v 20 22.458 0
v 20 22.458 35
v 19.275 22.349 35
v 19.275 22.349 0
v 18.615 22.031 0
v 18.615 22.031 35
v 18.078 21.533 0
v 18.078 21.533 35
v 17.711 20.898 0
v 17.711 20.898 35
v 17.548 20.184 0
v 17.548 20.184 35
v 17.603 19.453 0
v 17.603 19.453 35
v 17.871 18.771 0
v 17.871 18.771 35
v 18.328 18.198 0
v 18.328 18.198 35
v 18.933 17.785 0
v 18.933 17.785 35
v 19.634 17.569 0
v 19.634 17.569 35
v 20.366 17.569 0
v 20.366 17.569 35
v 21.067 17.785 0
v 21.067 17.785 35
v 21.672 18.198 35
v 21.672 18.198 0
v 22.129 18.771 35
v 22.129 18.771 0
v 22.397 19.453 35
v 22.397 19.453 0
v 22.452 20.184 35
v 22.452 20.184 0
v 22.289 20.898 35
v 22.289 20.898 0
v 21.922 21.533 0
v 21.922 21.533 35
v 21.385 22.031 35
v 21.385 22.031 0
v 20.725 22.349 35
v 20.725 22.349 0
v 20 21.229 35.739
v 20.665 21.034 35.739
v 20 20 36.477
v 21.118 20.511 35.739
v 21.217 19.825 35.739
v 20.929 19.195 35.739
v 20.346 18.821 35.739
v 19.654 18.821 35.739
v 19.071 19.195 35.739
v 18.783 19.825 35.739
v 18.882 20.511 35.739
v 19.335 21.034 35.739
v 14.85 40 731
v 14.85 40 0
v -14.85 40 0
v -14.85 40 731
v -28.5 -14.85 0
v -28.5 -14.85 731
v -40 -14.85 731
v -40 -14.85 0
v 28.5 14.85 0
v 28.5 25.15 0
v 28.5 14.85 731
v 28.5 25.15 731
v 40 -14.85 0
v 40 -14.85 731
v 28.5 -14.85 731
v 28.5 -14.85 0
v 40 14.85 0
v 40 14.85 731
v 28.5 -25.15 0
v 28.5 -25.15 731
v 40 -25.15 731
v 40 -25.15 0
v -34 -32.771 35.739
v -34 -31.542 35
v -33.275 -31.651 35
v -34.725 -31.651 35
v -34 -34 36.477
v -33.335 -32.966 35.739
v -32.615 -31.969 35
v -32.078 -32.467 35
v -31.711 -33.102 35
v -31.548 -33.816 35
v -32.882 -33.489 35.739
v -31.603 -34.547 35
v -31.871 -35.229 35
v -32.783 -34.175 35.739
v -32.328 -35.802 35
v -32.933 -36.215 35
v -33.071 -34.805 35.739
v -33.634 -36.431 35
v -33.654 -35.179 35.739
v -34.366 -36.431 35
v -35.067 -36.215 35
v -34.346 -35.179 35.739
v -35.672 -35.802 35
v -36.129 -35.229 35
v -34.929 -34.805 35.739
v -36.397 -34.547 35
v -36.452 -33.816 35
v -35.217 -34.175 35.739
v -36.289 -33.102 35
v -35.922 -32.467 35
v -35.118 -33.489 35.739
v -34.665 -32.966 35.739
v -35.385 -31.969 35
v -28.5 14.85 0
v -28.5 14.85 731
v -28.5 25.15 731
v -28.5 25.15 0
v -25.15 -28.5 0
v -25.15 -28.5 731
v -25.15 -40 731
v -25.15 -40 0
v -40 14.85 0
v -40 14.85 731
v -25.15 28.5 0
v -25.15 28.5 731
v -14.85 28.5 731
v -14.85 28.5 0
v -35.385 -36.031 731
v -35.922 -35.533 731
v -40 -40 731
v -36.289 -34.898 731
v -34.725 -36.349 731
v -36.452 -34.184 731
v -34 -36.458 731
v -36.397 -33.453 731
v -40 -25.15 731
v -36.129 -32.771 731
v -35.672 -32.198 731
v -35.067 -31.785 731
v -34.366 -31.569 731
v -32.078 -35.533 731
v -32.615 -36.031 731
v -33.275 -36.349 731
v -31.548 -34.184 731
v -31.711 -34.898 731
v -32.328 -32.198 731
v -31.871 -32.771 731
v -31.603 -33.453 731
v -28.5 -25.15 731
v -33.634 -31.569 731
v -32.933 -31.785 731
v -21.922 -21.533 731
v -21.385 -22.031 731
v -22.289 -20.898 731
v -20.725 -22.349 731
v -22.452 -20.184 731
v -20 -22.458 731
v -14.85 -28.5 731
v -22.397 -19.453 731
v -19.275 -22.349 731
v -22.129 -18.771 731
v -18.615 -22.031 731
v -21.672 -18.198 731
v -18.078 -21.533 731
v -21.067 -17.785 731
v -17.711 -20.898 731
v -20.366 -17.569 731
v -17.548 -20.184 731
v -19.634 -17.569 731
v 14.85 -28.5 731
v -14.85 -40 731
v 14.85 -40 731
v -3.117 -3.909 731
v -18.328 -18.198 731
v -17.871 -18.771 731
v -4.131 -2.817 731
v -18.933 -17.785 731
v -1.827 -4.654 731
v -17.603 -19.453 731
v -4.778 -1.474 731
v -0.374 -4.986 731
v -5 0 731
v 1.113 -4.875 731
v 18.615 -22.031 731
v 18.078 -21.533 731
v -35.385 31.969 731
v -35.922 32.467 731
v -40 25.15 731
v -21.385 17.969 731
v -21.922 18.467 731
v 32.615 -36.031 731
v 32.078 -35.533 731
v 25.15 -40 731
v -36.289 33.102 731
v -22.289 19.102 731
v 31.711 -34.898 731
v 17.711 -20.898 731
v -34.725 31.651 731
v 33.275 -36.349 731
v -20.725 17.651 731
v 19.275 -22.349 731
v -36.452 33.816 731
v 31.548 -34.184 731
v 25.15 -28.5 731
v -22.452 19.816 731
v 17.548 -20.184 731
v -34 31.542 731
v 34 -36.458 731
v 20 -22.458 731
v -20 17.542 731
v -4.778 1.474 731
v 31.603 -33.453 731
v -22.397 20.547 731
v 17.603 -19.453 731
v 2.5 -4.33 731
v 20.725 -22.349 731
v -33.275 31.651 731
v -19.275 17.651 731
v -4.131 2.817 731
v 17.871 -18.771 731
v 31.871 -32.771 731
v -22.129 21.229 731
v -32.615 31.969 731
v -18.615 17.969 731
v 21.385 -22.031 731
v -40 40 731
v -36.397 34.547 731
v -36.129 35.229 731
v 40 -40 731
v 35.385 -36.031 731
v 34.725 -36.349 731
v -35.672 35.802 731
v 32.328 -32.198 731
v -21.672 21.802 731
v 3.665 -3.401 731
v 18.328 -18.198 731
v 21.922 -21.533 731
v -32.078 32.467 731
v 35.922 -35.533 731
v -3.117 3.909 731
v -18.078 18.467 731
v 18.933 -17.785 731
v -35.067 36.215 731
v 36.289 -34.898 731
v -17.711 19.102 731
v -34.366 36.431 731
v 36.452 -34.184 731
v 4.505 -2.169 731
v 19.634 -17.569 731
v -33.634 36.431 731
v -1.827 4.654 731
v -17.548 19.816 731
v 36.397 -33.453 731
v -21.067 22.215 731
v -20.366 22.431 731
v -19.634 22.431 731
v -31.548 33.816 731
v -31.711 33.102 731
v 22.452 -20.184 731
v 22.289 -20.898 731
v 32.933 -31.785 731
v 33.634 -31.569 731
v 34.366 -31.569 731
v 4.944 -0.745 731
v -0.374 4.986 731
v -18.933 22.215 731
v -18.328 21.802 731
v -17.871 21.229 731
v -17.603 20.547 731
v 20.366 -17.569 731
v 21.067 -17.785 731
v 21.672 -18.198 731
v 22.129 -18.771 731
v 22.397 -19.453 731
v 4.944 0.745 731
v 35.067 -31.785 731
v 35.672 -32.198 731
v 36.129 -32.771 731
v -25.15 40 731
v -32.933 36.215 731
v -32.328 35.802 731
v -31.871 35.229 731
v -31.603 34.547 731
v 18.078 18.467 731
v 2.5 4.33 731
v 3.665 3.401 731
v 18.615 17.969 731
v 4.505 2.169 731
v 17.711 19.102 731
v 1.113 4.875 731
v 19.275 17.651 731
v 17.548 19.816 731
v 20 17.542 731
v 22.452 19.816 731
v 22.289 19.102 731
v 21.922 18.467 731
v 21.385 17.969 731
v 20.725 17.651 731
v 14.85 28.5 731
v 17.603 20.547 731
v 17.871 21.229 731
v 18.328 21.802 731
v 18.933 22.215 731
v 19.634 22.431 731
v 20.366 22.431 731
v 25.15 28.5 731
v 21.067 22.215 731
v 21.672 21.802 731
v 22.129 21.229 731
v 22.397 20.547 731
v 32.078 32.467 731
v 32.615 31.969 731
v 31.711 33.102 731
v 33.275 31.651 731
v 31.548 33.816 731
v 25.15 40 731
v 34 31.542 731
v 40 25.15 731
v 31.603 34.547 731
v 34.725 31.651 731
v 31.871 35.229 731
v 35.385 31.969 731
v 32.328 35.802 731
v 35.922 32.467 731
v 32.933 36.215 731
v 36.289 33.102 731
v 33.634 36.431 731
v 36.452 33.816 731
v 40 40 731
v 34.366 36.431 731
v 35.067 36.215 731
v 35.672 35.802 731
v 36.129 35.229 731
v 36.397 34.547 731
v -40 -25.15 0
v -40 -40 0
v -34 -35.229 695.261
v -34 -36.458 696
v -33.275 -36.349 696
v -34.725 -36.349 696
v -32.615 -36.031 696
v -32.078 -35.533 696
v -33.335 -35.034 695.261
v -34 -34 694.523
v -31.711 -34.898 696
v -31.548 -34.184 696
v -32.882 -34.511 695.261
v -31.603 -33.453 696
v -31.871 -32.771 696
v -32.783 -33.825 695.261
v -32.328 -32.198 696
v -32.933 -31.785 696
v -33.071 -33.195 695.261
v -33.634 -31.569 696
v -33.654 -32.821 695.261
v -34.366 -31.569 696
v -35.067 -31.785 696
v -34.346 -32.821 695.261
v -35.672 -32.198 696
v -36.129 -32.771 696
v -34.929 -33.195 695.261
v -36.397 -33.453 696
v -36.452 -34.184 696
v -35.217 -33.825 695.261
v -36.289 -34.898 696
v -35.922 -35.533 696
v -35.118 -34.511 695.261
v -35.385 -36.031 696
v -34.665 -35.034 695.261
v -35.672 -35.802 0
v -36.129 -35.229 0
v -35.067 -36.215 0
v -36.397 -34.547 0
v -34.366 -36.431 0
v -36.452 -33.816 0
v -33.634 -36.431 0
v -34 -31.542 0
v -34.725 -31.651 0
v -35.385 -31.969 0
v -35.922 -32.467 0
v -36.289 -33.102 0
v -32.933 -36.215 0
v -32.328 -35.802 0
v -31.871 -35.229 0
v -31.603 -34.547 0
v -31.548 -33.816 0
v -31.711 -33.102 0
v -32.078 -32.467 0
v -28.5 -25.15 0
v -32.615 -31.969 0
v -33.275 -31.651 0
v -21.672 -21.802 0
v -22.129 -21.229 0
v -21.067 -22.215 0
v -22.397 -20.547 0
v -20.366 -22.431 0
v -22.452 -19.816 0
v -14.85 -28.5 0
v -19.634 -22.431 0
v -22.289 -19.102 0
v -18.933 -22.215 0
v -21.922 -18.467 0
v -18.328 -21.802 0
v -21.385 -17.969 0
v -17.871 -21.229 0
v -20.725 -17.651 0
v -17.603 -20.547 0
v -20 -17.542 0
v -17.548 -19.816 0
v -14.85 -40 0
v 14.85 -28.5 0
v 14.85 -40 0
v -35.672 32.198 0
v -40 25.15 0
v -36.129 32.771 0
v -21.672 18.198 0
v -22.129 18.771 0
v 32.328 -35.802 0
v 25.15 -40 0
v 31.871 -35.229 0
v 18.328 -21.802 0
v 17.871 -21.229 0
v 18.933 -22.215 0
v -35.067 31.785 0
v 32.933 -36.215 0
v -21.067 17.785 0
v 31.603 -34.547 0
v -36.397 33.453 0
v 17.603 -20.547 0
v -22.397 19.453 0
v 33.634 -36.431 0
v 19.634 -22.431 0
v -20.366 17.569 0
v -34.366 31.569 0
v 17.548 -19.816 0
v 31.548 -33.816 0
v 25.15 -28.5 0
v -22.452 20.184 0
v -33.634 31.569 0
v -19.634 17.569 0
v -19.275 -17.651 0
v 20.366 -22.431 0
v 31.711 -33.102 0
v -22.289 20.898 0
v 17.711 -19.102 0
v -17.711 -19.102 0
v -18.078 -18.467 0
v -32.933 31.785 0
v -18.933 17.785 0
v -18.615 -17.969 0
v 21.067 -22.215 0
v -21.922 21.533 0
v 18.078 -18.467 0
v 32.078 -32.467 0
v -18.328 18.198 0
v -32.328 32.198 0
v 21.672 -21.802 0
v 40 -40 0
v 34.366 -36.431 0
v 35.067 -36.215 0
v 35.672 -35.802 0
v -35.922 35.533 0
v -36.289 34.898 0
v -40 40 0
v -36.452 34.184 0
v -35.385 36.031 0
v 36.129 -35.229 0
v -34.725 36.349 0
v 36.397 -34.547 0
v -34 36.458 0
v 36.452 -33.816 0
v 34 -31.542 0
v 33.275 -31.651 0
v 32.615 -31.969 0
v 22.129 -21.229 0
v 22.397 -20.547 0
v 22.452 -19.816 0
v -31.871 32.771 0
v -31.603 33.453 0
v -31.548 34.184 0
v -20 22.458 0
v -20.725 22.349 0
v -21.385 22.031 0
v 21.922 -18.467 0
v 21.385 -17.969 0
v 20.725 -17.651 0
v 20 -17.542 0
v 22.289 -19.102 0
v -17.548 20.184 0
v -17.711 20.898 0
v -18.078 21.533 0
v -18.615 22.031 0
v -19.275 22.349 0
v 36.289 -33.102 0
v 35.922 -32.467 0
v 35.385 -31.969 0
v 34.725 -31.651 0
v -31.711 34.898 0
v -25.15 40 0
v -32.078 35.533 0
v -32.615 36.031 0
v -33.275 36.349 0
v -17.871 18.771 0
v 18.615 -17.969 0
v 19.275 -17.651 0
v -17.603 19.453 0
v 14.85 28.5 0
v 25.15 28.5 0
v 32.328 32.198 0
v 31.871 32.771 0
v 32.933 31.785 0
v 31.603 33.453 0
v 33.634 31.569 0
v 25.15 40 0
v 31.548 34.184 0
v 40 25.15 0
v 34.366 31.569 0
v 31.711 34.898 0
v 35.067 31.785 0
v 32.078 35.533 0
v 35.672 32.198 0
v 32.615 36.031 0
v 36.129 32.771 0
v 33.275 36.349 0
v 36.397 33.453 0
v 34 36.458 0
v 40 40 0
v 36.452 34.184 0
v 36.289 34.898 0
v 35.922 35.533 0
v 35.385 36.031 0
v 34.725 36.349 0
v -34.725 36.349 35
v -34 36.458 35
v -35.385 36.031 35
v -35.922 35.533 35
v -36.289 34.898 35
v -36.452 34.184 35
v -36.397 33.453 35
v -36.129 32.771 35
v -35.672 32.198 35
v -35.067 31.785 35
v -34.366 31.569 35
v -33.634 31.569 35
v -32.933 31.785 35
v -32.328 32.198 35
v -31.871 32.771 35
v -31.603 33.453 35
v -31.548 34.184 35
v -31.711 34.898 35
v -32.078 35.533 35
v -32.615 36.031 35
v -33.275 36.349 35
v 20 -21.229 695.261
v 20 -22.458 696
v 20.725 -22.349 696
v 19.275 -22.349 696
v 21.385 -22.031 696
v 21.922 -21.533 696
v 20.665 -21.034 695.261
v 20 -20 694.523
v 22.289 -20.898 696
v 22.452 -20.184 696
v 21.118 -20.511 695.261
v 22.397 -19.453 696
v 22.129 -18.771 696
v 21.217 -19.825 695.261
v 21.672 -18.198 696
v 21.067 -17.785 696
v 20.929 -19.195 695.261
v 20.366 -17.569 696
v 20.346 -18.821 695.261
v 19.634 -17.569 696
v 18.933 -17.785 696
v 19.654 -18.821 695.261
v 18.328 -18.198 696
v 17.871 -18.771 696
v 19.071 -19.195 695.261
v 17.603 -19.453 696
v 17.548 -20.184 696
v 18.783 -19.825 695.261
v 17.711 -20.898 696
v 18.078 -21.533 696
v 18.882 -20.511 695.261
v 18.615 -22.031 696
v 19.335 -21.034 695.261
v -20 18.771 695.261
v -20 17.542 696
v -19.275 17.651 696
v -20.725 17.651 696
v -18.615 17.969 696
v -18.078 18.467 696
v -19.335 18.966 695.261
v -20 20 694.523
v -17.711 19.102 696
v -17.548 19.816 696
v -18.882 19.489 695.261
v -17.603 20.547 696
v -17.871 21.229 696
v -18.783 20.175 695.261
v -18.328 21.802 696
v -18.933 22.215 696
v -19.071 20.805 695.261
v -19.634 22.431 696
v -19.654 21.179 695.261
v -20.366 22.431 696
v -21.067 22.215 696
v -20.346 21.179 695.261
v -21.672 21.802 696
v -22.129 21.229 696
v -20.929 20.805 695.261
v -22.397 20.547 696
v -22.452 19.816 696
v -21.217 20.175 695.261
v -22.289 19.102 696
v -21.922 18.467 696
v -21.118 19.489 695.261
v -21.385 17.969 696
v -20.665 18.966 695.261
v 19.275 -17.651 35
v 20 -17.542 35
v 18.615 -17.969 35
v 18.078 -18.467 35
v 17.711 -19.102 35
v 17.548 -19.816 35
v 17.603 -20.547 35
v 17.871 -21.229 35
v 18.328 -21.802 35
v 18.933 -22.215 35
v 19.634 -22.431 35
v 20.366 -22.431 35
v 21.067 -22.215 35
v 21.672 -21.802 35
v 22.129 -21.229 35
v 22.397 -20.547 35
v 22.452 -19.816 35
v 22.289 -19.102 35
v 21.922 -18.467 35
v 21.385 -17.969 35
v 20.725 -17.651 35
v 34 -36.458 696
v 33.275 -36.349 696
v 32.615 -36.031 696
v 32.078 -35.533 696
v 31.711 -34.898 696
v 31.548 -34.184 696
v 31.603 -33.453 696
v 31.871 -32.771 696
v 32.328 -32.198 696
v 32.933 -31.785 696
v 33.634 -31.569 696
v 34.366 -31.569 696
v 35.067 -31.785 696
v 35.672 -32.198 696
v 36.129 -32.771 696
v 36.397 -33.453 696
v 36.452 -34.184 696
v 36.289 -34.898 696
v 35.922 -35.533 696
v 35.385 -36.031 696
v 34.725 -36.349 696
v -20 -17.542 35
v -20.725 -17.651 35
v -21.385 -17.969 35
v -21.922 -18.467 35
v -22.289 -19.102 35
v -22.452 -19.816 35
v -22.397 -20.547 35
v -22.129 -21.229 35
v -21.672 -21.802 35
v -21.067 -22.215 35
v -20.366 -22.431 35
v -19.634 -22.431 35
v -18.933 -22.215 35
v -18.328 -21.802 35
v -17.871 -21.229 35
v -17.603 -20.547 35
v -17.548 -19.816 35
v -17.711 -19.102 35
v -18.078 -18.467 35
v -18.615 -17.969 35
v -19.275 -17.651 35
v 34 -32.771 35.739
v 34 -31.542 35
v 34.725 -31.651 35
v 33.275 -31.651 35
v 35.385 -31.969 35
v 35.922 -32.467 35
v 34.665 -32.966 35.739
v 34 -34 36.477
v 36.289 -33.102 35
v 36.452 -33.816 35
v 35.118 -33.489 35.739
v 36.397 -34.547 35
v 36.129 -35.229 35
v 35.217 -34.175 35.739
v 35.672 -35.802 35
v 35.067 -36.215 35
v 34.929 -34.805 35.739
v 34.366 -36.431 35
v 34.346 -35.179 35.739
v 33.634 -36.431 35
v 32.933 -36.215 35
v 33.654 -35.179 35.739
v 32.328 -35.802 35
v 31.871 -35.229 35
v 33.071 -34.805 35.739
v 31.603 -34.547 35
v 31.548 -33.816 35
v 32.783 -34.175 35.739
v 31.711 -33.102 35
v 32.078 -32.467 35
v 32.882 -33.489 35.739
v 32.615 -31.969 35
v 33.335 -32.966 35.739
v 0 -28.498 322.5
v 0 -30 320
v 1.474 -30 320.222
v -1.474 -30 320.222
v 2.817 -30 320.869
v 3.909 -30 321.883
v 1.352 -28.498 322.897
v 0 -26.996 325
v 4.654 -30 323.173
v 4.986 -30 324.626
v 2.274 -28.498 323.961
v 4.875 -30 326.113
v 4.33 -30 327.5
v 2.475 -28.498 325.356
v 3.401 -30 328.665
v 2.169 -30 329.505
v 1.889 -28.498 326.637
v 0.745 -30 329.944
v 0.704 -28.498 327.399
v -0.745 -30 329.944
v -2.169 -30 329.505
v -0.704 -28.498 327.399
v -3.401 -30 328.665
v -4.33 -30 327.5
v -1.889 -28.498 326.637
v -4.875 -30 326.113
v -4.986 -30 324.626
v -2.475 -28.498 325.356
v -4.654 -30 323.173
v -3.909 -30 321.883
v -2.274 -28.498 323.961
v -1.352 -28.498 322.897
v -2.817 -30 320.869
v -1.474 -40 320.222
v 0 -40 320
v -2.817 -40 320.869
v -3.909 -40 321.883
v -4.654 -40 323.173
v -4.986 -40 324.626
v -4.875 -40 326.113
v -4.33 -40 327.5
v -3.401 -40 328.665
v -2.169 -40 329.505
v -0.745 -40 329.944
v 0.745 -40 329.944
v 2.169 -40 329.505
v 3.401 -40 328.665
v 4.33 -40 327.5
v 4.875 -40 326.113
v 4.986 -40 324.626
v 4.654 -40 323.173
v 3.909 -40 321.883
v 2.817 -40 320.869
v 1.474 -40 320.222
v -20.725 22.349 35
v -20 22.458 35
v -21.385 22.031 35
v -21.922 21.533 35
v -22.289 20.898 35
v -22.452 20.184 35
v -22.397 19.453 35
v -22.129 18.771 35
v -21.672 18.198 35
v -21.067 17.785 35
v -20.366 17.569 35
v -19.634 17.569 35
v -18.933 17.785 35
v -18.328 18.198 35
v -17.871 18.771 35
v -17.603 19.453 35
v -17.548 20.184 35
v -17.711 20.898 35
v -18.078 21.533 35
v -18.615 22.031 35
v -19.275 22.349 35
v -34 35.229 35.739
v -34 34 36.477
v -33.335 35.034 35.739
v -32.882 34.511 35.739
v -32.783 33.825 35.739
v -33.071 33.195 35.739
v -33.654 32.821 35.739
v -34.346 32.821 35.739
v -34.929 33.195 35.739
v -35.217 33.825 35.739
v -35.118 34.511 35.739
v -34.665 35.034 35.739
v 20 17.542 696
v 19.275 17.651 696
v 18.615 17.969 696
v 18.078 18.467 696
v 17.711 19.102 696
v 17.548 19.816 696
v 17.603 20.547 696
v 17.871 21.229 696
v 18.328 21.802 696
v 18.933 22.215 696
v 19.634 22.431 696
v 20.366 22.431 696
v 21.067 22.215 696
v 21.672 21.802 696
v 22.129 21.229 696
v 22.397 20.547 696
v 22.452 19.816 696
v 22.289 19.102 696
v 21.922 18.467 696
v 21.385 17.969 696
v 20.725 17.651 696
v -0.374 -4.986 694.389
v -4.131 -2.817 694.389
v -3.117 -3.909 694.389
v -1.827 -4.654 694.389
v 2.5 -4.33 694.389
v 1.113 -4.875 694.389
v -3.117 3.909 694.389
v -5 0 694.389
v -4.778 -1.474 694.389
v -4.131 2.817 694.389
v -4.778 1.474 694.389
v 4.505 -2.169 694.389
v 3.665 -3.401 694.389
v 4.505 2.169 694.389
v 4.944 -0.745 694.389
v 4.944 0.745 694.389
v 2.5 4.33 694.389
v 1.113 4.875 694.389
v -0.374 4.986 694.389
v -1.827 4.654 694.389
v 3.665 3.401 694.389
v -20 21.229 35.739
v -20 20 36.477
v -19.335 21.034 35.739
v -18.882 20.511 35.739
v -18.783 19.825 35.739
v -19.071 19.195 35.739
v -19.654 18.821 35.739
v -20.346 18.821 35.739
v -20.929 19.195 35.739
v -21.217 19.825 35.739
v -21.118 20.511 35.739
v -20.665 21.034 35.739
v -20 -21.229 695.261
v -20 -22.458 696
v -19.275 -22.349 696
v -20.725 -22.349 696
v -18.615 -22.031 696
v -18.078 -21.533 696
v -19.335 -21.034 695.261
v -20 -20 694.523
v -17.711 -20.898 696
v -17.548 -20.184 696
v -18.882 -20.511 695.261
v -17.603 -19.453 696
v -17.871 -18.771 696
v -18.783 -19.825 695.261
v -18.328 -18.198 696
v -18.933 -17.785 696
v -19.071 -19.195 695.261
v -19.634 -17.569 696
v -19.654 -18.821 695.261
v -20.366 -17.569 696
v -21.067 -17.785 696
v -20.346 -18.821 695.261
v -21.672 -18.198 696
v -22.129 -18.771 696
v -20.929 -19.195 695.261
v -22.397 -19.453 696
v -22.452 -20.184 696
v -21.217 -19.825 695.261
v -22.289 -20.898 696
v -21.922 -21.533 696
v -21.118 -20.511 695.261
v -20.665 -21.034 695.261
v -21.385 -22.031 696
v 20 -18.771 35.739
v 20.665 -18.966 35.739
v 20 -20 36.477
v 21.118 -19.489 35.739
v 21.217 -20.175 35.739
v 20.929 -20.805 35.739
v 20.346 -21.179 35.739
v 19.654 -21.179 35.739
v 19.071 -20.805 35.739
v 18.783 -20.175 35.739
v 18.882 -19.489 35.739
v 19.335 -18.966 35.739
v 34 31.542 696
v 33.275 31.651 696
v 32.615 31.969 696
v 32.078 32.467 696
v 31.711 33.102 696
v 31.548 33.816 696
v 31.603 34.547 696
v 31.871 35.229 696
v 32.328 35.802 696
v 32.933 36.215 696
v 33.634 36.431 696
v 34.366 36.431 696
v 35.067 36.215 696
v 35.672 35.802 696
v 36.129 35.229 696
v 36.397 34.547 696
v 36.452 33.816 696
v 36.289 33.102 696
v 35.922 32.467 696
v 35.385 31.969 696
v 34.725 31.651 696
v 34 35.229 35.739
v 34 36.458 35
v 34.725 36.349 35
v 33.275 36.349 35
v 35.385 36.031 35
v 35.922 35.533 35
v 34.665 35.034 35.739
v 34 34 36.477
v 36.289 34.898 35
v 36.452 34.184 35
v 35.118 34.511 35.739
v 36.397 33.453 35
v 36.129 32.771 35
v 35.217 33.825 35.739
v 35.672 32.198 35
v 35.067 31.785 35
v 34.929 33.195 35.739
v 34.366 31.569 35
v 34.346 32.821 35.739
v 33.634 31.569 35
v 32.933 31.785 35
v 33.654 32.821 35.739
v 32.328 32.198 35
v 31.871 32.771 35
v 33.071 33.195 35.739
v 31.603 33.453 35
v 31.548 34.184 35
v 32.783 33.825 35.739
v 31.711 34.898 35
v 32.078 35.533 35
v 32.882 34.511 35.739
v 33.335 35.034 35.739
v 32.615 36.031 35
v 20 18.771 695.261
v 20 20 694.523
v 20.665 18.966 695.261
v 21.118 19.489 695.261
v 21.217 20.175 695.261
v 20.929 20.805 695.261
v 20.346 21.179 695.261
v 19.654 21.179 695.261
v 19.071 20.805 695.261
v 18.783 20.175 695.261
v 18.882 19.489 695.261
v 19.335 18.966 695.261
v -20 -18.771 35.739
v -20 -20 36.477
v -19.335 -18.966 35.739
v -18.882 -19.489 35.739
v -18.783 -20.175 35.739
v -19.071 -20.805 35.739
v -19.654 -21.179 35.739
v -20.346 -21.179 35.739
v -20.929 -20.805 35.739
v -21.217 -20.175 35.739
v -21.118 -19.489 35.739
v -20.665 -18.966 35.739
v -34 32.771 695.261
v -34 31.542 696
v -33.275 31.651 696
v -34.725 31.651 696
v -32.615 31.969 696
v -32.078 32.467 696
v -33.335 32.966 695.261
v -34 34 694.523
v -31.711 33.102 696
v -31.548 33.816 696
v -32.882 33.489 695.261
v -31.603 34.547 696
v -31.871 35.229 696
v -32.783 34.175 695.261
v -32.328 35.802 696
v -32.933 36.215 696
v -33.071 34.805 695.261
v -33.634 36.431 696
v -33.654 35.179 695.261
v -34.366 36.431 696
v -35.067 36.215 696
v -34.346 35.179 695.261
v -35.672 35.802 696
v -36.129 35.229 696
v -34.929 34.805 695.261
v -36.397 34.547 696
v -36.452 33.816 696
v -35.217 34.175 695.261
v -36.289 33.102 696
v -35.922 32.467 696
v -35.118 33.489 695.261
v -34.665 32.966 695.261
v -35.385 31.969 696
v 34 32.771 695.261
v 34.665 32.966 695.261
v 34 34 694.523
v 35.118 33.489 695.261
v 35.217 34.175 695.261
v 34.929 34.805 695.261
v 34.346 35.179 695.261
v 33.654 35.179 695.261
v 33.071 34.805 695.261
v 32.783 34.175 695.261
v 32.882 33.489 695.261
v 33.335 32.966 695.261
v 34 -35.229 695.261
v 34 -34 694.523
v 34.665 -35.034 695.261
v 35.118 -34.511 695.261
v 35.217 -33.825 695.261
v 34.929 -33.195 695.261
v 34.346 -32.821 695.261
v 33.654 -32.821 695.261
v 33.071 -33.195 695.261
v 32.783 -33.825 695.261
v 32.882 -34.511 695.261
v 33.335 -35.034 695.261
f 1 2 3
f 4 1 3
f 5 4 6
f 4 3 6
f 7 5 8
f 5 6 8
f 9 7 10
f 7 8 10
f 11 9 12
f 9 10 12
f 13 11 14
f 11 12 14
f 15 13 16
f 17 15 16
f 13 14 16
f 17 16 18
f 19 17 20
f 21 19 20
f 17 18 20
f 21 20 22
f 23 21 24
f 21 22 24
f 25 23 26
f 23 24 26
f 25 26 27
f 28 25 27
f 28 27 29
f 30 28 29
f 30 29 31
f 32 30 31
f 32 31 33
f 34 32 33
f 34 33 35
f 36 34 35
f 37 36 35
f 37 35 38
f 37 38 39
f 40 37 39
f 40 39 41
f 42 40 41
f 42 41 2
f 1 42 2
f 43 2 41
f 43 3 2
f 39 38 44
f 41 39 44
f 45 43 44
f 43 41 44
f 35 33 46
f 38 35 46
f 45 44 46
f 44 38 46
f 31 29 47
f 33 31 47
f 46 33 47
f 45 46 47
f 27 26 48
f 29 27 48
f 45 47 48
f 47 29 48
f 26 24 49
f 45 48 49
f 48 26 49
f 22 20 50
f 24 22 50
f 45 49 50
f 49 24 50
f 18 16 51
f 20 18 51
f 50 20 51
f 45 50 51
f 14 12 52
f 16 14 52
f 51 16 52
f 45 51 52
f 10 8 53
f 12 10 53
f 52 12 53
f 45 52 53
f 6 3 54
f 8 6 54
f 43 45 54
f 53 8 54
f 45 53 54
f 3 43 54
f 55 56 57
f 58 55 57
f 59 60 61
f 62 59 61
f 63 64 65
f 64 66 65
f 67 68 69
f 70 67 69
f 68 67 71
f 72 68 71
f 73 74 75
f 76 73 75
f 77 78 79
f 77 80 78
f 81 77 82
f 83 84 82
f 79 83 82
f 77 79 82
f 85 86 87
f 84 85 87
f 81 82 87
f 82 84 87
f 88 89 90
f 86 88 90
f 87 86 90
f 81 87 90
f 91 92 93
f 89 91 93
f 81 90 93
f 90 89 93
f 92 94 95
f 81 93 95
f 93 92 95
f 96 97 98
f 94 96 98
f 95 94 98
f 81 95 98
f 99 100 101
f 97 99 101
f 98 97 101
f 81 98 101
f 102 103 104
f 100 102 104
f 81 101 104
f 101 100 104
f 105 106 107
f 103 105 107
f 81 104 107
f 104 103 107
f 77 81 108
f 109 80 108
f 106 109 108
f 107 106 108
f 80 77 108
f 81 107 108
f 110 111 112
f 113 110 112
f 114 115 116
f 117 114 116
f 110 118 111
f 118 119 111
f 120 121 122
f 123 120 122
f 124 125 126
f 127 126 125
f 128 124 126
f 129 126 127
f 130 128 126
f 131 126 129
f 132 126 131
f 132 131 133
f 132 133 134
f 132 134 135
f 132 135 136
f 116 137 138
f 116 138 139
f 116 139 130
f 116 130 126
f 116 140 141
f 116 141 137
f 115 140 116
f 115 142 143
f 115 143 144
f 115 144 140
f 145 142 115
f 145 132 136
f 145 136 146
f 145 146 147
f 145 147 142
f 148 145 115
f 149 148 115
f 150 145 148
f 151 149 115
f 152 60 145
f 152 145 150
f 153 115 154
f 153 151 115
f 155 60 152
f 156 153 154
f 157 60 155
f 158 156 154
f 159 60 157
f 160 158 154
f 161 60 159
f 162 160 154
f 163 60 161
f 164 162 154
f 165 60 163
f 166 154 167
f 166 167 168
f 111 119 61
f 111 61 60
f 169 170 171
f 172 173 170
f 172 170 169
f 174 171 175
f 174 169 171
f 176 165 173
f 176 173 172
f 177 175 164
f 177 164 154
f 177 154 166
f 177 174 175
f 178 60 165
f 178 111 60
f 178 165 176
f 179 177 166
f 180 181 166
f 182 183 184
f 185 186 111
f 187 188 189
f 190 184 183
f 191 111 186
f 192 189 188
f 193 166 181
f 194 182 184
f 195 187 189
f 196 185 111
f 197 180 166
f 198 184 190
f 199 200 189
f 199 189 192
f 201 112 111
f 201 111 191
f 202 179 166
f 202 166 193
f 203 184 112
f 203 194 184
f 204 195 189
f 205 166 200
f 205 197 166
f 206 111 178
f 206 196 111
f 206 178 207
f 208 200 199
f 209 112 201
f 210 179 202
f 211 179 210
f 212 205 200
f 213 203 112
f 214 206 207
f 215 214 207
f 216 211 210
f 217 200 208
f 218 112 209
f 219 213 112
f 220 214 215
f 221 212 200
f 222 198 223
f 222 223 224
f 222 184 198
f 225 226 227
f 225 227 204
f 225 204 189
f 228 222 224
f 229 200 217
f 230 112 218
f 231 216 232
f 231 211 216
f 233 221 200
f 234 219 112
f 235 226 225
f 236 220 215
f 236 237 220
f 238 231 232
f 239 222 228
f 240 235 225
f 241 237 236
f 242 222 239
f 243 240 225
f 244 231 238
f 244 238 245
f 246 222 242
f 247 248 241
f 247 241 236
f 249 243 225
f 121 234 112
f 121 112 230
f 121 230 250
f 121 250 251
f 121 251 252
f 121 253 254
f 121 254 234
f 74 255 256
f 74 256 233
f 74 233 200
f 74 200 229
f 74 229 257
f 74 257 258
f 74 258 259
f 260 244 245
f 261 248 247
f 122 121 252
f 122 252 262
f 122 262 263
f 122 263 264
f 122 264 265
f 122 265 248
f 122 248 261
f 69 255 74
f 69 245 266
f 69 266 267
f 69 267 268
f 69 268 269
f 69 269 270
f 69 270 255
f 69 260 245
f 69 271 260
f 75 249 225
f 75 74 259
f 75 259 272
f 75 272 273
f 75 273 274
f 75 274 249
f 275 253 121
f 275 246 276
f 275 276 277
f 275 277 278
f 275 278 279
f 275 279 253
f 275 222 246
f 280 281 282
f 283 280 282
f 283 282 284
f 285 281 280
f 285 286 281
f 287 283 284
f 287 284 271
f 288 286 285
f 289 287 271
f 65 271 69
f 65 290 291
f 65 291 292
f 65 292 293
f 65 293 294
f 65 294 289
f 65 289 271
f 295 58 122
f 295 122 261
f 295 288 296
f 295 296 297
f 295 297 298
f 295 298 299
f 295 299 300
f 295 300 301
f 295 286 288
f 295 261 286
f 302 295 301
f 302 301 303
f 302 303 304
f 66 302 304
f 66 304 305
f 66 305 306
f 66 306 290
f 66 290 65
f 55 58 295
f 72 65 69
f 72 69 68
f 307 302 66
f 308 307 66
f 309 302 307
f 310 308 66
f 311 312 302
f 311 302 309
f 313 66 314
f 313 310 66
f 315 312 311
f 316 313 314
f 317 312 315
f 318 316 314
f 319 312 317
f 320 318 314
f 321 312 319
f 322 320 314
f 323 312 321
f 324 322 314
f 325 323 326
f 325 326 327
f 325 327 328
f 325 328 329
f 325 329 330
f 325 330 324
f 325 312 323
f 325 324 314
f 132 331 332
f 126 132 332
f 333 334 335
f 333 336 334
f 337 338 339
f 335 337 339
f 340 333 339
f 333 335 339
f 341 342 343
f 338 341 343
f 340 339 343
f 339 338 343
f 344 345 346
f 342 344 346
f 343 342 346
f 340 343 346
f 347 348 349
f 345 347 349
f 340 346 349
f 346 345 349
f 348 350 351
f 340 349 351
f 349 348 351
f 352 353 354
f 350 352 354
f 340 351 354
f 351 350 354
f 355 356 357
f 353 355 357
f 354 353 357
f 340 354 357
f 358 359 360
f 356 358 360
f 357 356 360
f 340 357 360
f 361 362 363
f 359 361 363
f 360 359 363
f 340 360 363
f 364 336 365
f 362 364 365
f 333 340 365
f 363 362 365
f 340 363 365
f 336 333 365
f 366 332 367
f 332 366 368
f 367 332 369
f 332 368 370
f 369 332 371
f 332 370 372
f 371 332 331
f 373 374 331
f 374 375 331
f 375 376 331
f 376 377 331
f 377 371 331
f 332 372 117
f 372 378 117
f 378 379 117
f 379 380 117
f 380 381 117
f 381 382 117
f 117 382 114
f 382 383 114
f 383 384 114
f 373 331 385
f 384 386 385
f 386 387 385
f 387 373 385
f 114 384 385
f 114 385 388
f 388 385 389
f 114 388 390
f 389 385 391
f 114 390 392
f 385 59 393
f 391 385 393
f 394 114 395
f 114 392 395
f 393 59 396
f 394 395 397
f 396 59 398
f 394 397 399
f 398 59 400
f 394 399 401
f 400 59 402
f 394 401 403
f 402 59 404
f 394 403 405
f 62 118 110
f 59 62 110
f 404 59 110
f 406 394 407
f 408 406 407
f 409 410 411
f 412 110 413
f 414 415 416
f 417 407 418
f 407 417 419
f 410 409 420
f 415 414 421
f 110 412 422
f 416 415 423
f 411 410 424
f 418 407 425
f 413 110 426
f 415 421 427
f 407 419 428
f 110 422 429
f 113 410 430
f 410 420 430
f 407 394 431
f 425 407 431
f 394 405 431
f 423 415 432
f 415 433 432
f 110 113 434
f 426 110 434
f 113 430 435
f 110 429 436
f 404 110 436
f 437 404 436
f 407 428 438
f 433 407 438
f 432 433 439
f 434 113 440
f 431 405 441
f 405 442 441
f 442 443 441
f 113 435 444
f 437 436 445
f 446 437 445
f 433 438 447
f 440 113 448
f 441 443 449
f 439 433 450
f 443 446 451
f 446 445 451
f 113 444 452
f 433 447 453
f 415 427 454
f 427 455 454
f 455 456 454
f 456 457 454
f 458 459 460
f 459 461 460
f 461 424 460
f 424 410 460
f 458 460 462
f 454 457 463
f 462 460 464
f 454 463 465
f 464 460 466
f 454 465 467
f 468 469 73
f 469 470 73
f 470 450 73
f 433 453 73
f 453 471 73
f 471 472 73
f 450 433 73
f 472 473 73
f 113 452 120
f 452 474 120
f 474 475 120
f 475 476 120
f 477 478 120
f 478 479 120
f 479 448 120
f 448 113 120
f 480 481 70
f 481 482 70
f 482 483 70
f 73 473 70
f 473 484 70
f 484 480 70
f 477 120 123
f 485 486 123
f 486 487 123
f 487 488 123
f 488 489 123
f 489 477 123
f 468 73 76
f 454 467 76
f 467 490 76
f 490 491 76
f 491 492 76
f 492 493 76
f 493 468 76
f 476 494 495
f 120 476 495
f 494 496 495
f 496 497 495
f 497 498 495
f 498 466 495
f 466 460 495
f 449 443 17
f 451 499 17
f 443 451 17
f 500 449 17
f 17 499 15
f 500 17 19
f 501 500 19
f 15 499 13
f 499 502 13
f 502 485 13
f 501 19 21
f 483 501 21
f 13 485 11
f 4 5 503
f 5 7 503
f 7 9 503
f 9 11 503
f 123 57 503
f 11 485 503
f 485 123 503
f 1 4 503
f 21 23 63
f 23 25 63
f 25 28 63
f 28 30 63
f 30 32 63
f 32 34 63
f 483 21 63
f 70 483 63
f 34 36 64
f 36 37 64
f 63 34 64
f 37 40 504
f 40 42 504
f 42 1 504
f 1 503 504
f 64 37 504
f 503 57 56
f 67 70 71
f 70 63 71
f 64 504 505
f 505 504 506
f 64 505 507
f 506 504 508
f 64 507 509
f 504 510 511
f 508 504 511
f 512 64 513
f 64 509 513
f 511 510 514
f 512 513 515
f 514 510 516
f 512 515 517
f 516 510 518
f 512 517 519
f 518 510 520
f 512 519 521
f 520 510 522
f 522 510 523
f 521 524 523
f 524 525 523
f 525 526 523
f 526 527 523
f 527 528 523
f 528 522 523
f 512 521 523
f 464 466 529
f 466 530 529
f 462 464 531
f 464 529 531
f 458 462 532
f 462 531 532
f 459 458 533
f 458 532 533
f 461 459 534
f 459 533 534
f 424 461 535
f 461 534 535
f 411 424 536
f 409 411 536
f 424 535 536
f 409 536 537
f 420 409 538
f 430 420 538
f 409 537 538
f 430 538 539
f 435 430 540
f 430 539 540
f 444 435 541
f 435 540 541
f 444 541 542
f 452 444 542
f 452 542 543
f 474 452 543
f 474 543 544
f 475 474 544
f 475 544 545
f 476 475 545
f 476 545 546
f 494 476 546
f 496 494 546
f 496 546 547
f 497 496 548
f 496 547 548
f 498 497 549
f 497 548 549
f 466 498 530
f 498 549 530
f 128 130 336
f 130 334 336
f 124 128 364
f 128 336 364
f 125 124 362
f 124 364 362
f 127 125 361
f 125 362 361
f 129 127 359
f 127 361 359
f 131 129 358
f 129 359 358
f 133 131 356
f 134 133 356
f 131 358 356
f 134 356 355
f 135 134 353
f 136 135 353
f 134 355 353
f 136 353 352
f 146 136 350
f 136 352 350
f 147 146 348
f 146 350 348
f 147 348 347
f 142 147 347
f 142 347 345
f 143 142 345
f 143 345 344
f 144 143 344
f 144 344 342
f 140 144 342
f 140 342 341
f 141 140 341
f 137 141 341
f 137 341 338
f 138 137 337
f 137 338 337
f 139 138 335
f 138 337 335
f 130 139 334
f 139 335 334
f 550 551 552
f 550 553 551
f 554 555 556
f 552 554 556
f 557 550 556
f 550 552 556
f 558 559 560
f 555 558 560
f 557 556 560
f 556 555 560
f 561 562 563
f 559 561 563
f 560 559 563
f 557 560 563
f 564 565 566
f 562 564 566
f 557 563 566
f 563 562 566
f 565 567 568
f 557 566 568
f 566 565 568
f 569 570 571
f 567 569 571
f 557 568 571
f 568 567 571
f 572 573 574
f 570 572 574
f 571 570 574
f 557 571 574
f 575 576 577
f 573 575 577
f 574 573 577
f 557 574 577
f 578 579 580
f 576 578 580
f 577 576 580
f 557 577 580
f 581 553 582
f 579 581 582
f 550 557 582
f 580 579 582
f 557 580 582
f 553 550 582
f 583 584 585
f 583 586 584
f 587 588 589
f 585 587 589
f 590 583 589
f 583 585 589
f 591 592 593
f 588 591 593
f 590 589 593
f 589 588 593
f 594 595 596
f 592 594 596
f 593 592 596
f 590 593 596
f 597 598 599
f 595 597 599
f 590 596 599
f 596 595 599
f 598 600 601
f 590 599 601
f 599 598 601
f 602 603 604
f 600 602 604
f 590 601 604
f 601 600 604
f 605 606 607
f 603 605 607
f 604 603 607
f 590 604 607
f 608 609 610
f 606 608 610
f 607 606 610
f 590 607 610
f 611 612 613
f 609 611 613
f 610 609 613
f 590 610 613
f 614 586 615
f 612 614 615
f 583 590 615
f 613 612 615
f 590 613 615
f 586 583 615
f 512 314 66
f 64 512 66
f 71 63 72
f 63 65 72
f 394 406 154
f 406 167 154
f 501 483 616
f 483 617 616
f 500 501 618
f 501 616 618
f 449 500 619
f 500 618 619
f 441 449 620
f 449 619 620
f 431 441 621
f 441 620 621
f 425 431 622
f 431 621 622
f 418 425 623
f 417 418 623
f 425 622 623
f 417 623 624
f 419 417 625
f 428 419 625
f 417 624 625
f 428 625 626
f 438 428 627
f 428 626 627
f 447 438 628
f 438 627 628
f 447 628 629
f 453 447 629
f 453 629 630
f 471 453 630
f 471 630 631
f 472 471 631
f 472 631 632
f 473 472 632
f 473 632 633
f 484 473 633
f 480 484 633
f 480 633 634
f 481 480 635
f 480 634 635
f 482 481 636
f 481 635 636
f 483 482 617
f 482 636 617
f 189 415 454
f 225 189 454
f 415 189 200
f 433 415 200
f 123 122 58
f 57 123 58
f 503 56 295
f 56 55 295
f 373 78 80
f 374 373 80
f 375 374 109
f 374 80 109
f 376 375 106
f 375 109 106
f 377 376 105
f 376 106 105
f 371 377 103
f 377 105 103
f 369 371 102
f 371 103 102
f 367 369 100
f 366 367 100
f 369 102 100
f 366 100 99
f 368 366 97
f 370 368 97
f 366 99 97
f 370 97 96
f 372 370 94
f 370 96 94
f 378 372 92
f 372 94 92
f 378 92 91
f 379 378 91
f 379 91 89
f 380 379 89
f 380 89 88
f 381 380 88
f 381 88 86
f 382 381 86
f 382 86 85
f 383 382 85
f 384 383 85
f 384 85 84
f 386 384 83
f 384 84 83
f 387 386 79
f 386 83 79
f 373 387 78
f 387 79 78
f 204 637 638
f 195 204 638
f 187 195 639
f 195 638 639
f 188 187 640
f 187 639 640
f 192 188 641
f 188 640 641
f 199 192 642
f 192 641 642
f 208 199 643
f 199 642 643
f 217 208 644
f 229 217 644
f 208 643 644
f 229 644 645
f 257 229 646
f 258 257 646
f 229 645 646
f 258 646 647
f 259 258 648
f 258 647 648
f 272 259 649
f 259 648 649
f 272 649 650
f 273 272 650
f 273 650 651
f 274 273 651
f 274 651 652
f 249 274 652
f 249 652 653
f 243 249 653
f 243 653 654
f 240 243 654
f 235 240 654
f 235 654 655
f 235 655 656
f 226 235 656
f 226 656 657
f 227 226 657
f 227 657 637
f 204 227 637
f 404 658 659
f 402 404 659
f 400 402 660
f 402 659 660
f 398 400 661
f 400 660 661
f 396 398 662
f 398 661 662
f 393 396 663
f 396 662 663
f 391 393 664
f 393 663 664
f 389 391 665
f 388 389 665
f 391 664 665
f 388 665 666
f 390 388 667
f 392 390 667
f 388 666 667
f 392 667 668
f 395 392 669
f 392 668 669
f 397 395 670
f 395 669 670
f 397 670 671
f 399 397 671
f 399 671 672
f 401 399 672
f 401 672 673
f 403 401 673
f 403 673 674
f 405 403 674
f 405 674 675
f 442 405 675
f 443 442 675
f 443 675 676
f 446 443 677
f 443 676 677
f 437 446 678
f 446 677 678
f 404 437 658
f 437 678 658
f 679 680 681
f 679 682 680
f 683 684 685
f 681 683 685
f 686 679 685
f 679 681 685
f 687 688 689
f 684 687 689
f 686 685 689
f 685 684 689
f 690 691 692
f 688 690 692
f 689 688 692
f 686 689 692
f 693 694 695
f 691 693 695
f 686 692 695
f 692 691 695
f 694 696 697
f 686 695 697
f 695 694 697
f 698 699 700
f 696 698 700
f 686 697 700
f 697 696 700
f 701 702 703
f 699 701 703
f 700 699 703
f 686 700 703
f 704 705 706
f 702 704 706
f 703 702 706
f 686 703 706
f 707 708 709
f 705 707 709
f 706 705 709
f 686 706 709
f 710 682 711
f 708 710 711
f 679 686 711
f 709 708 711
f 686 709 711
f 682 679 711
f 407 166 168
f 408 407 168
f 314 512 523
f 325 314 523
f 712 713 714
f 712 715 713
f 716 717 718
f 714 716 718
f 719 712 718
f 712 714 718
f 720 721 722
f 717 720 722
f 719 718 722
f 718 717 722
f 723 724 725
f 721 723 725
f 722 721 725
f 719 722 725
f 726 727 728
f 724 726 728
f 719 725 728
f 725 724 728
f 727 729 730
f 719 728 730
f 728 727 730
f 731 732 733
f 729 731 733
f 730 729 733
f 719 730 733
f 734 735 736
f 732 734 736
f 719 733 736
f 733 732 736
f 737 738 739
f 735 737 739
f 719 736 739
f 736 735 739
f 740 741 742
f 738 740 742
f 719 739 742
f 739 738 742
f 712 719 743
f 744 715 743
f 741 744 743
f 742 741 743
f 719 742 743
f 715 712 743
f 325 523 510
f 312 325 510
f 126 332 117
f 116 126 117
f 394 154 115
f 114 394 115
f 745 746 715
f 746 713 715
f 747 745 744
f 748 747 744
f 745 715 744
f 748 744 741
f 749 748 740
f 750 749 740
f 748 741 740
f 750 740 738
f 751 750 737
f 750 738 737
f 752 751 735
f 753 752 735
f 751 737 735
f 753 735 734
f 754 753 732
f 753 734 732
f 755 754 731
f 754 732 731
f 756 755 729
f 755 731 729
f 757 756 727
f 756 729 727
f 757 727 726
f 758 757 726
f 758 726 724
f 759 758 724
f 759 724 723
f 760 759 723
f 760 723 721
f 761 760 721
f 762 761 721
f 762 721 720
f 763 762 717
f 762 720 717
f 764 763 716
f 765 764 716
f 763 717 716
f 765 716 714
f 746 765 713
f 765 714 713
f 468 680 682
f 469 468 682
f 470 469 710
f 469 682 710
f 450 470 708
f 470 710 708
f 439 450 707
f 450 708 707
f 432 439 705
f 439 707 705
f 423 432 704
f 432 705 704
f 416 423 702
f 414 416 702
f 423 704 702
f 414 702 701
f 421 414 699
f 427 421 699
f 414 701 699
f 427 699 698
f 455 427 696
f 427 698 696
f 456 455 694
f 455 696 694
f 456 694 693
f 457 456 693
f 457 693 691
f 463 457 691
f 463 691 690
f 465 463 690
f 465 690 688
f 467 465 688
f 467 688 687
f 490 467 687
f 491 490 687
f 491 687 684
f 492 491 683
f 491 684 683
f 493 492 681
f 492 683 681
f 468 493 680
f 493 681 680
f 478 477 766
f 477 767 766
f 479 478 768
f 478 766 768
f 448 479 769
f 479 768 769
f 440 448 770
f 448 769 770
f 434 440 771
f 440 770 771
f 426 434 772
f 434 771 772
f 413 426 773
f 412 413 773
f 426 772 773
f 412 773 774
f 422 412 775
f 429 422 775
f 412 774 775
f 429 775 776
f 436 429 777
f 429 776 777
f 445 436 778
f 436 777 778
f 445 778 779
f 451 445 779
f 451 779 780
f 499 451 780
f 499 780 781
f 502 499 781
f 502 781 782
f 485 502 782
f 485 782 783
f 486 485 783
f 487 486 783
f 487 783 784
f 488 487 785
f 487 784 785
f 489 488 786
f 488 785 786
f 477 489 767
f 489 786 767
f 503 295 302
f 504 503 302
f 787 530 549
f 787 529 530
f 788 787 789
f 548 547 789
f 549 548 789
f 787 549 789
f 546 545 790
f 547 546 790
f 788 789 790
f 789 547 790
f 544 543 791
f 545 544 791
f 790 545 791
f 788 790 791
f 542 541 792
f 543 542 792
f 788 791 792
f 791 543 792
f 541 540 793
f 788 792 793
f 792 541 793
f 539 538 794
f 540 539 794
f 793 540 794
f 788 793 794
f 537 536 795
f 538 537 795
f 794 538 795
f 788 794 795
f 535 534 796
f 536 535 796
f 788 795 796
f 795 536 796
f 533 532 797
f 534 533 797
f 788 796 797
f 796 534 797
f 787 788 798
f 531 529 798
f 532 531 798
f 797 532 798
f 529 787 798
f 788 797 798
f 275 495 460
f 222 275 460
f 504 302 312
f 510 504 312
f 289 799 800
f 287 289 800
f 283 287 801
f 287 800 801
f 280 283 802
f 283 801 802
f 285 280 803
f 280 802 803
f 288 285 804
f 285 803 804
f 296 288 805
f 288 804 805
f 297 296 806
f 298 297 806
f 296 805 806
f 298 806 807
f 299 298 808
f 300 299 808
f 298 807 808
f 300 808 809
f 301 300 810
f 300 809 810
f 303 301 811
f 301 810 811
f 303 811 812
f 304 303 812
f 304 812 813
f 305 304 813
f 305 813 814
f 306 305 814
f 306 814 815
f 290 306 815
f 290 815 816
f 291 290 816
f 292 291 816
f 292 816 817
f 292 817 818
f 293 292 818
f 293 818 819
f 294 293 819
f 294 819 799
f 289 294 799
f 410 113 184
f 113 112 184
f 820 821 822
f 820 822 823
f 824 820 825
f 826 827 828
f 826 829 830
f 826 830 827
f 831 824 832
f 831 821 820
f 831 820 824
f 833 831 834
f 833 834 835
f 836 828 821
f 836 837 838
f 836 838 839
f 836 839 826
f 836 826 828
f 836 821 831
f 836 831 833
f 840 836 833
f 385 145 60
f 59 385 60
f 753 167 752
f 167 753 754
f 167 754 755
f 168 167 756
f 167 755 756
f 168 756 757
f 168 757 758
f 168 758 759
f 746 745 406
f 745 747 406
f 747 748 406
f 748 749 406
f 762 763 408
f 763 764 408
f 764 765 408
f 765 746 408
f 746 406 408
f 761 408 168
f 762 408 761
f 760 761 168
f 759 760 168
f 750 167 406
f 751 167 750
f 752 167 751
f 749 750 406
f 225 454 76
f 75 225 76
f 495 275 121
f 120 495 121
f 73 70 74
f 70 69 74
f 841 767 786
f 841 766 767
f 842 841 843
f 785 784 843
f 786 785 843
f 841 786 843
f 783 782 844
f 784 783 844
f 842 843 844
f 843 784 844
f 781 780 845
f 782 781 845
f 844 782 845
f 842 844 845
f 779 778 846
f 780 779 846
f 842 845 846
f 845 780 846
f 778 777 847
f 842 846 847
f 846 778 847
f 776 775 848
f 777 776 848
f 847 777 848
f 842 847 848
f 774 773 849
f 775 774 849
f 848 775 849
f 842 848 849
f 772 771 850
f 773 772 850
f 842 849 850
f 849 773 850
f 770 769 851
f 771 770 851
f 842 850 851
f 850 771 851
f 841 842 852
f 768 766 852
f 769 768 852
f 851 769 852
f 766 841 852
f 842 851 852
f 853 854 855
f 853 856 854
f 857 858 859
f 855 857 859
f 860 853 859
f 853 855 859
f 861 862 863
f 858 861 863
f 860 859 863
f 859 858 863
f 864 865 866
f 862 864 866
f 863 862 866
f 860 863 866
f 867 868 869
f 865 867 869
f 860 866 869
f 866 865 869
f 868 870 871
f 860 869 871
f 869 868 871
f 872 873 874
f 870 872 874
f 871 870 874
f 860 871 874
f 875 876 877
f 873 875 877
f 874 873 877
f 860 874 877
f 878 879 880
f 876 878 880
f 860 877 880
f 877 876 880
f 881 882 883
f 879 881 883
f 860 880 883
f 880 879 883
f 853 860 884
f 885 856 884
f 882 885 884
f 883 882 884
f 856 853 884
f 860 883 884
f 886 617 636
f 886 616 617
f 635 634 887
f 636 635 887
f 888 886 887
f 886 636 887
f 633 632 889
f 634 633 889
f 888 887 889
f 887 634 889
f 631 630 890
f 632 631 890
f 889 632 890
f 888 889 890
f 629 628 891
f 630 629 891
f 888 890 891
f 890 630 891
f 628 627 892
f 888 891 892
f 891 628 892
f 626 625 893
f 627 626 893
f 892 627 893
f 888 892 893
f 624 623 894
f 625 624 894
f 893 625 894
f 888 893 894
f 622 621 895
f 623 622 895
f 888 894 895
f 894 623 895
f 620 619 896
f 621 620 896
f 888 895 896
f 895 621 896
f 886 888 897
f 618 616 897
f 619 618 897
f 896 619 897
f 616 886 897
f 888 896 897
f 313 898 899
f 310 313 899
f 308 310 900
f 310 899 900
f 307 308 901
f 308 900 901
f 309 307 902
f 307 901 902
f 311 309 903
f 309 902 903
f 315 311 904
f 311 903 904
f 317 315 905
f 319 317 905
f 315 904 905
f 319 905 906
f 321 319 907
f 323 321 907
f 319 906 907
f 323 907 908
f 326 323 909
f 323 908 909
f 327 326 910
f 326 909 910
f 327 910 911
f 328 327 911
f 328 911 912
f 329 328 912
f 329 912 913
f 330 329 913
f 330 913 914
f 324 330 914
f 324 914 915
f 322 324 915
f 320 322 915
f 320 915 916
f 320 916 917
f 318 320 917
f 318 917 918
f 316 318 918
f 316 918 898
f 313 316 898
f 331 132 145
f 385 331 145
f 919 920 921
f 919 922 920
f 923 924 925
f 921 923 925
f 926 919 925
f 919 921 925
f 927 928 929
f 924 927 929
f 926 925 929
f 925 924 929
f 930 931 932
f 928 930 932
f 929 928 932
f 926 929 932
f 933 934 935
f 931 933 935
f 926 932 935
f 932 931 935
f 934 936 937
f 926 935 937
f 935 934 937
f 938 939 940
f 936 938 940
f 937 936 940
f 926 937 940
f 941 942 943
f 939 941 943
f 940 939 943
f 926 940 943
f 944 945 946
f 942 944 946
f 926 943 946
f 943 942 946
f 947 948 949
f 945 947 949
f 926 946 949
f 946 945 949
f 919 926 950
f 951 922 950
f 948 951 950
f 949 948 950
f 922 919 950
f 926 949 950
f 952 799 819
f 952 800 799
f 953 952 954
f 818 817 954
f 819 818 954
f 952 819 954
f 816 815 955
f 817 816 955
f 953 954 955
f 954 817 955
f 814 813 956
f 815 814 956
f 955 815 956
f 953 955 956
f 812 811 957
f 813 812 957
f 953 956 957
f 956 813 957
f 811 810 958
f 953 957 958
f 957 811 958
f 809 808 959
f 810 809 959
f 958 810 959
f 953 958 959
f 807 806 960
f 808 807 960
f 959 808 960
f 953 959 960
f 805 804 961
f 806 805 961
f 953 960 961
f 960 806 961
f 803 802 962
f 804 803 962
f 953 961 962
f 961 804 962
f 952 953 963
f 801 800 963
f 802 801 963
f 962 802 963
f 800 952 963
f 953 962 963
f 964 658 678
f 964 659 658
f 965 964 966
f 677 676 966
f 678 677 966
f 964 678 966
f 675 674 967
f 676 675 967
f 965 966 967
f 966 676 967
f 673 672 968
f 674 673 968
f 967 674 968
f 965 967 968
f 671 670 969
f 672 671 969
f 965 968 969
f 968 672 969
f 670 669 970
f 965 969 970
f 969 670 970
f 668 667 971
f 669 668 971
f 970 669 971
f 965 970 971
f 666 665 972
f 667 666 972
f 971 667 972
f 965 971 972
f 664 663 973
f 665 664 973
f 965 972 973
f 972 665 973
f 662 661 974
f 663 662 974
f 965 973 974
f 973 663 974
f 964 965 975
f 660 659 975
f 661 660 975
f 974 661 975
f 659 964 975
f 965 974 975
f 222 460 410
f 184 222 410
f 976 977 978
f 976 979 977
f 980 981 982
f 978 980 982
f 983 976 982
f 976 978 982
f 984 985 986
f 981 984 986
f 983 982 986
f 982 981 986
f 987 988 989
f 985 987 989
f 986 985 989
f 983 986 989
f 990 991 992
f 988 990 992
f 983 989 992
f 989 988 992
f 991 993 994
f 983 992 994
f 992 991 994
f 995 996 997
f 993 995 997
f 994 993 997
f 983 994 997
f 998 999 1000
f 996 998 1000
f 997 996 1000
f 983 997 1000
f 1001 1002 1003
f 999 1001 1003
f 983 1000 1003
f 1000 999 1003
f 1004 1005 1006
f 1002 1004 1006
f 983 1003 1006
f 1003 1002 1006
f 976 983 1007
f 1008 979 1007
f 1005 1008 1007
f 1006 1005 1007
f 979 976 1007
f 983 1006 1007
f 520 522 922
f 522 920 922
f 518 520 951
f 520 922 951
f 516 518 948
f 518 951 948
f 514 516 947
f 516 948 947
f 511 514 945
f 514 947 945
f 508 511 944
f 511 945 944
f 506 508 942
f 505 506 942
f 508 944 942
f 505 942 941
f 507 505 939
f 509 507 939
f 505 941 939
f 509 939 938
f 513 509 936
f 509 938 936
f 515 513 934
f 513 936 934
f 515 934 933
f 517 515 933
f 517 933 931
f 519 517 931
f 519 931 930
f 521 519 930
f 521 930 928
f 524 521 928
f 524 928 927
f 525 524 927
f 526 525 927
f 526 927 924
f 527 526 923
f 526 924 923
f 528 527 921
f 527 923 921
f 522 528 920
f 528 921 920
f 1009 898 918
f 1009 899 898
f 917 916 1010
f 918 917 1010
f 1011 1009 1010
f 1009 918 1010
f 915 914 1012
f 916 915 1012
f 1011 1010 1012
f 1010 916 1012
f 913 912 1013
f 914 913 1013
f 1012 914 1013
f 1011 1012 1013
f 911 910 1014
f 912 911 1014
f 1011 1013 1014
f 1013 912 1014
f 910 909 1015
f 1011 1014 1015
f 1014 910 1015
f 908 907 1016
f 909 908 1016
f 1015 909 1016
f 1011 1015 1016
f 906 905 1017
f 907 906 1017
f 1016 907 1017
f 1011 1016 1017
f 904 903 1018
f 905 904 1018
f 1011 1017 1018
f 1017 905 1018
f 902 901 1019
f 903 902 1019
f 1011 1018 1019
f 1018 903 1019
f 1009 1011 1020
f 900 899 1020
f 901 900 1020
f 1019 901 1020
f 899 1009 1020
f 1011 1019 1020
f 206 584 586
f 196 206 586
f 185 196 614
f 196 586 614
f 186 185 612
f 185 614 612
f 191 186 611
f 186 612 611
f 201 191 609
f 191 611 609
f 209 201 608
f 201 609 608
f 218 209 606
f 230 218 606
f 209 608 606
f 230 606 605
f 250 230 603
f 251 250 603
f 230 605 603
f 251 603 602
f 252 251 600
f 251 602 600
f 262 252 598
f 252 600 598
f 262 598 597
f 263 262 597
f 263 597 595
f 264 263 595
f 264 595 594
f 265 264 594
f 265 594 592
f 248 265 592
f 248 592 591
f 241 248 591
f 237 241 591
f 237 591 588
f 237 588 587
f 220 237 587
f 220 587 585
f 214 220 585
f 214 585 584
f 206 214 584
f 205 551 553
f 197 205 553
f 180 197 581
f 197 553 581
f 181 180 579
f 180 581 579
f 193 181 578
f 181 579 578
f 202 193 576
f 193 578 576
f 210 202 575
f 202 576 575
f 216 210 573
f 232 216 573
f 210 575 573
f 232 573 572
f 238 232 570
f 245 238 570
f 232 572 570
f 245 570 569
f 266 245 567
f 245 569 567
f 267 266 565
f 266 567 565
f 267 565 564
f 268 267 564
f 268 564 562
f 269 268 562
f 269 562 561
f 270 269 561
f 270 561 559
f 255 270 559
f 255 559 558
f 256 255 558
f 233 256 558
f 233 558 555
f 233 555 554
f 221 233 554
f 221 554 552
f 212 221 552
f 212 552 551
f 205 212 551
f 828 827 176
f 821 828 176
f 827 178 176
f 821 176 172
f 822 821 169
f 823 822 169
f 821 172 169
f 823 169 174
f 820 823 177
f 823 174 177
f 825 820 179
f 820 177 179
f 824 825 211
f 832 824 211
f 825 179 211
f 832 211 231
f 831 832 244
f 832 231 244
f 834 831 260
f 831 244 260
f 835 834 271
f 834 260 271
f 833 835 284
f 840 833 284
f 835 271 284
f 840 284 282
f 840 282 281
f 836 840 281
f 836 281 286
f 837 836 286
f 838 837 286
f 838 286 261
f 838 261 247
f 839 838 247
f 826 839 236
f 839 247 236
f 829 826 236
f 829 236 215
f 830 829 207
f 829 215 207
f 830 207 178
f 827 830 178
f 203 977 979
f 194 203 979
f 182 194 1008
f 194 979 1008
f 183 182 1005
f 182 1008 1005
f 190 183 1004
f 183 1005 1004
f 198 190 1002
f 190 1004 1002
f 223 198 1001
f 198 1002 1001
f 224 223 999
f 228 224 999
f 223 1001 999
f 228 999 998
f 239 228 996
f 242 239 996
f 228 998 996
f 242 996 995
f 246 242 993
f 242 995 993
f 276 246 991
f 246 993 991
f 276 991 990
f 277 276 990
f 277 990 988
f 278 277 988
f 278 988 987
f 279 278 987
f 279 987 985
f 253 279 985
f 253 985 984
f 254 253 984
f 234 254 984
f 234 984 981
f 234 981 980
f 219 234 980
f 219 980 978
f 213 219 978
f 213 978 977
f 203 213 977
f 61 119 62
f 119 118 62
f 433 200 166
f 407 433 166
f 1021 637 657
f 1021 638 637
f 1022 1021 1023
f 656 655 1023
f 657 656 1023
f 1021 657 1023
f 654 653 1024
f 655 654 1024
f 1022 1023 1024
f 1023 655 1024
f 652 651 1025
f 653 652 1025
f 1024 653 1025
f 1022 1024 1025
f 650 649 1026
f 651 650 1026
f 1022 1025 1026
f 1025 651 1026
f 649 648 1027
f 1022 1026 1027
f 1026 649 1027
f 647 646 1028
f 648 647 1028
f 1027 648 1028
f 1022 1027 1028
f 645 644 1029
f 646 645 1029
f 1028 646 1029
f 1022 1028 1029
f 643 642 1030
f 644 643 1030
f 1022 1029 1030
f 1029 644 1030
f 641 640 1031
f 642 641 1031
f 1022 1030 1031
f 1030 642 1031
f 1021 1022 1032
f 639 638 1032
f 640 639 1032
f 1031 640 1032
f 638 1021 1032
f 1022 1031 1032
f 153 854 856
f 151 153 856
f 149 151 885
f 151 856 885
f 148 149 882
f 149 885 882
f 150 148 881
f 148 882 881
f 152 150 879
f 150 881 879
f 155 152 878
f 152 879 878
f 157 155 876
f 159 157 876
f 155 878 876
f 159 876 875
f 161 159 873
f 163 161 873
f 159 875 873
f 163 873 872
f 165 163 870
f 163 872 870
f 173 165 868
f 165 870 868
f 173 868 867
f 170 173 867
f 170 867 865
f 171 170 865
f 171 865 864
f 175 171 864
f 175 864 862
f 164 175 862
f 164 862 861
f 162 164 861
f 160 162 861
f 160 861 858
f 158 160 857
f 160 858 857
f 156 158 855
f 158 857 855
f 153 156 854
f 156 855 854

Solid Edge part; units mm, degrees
sketch "Sketch1" plane through (0, 0, 0) normal (0, 0, 1) x (1, 0, 0)
  line L0 (40, -40) -> (40, 40)
  line L1 (40, 40) -> (-40, 40)
  line L2 (-40, 40) -> (-40, -40)
  line L3 (-40, -40) -> (40, -40)
extrude "Protrusion1" add sketch "Sketch1" along normal blind 731
extrude "Extrusionsausschnitt_1" [suppressed]
extrude "Protrusion2" [suppressed]
extrude "Protrusion3" [suppressed]
hole "Bohrung_1" at (0, -60, 325) direction (0, 1, 0) diameter 10 depth 30 tip angle 118 counterbore diameter 15 counterbore depth 8.8
mirror "Mirror1" [suppressed]
sketch "Sketch2" plane through (0, 0, 731) normal (0, 0, 1) x (-1, 0, 0)
  circle A0 centre (0, 0) radius 5
extrude "Extrusionsausschnitt_2" cut sketch "Sketch2" against normal blind 36.6109
sketch "Sketch3" plane through (0, 0, 731) normal (0, 0, 1) x (1, 0, 0)
  line L0 (28.5, -25.15) -> (40, -25.15)
  line L1 (40, -25.15) -> (40, -14.85)
  line L2 (40, -14.85) -> (28.5, -14.85)
  line L3 (28.5, -14.85) -> (28.5, -25.15)
  line L4 (28.5, 14.85) -> (40, 14.85)
  line L5 (40, 14.85) -> (40, 25.15)
  line L6 (40, 25.15) -> (28.5, 25.15)
  line L7 (28.5, 25.15) -> (28.5, 14.85)
  dimension "D1" = 10.3
  dimension "D2" = 11.5
  dimension "D3" = 20
  dimension "D4" = 20
extrude "Cutout1" cut sketch "Sketch3" against normal up to vertex (731 mm away)
extrude "Extrusionsausschnitt_4" [suppressed]
mirror "Mirror2" about plane through (-6.1475, 6.1475, 8.6939) normal (0.7071, 0.7071, 0) of "Cutout1"
mirror "Mirror3" about plane through (0, 0, 0) normal (1, 0, 0) of "Cutout1"
mirror "Mirror4" about plane through (0, 0, 0) normal (0, -1, 0) of "Mirror2"
hole "Bohrung_2" at (-34, -34, 0) direction (0, 0, 1) diameter 4.917 depth 35 tip angle 118 thread major 6 thread length 30
hole "Hole1" at (34, -34, 0) direction (0, 0, 1) diameter 4.917 depth 35 tip angle 118 thread major 6 thread length 30
hole "Hole2" at (34, 34, 0) direction (0, 0, 1) diameter 4.917 depth 35 tip angle 118 thread major 6 thread length 30
hole "Hole3" at (-34, 34, 0) direction (0, 0, 1) diameter 4.917 depth 35 tip angle 118 thread major 6 thread length 30
hole "Hole4" at (-20, -20, 0) direction (0, 0, 1) diameter 4.917 depth 35 tip angle 118 thread major 6 thread length 30
hole "Hole5" at (20, -20, 0) direction (0, 0, 1) diameter 4.917 depth 35 tip angle 118 thread major 6 thread length 30
hole "Hole6" at (20, 20, 0) direction (0, 0, 1) diameter 4.917 depth 35 tip angle 118 thread major 6 thread length 30
hole "Hole7" at (-20, 20, 0) direction (0, 0, 1) diameter 4.917 depth 35 tip angle 118 thread major 6 thread length 30
hole "Bohrung_6" at (-34, 34, 731) direction (0, 0, -1) diameter 4.917 depth 35 tip angle 118 thread major 6 thread length 30
hole "Hole8" at (-34, -34, 731) direction (0, 0, -1) diameter 4.917 depth 35 tip angle 118 thread major 6 thread length 30
hole "Hole9" at (34, 34, 731) direction (0, 0, -1) diameter 4.917 depth 35 tip angle 118 thread major 6 thread length 30
hole "Hole10" at (34, -34, 731) direction (0, 0, -1) diameter 4.917 depth 35 tip angle 118 thread major 6 thread length 30
hole "Hole11" at (-20, -20, 731) direction (0, 0, -1) diameter 4.917 depth 35 tip angle 118 thread major 6 thread length 30
hole "Hole12" at (-20, 20, 731) direction (0, 0, -1) diameter 4.917 depth 35 tip angle 118 thread major 6 thread length 30
hole "Hole13" at (20, 20, 731) direction (0, 0, -1) diameter 4.917 depth 35 tip angle 118 thread major 6 thread length 30
hole "Hole14" at (20, -20, 731) direction (0, 0, -1) diameter 4.917 depth 35 tip angle 118 thread major 6 thread length 30
